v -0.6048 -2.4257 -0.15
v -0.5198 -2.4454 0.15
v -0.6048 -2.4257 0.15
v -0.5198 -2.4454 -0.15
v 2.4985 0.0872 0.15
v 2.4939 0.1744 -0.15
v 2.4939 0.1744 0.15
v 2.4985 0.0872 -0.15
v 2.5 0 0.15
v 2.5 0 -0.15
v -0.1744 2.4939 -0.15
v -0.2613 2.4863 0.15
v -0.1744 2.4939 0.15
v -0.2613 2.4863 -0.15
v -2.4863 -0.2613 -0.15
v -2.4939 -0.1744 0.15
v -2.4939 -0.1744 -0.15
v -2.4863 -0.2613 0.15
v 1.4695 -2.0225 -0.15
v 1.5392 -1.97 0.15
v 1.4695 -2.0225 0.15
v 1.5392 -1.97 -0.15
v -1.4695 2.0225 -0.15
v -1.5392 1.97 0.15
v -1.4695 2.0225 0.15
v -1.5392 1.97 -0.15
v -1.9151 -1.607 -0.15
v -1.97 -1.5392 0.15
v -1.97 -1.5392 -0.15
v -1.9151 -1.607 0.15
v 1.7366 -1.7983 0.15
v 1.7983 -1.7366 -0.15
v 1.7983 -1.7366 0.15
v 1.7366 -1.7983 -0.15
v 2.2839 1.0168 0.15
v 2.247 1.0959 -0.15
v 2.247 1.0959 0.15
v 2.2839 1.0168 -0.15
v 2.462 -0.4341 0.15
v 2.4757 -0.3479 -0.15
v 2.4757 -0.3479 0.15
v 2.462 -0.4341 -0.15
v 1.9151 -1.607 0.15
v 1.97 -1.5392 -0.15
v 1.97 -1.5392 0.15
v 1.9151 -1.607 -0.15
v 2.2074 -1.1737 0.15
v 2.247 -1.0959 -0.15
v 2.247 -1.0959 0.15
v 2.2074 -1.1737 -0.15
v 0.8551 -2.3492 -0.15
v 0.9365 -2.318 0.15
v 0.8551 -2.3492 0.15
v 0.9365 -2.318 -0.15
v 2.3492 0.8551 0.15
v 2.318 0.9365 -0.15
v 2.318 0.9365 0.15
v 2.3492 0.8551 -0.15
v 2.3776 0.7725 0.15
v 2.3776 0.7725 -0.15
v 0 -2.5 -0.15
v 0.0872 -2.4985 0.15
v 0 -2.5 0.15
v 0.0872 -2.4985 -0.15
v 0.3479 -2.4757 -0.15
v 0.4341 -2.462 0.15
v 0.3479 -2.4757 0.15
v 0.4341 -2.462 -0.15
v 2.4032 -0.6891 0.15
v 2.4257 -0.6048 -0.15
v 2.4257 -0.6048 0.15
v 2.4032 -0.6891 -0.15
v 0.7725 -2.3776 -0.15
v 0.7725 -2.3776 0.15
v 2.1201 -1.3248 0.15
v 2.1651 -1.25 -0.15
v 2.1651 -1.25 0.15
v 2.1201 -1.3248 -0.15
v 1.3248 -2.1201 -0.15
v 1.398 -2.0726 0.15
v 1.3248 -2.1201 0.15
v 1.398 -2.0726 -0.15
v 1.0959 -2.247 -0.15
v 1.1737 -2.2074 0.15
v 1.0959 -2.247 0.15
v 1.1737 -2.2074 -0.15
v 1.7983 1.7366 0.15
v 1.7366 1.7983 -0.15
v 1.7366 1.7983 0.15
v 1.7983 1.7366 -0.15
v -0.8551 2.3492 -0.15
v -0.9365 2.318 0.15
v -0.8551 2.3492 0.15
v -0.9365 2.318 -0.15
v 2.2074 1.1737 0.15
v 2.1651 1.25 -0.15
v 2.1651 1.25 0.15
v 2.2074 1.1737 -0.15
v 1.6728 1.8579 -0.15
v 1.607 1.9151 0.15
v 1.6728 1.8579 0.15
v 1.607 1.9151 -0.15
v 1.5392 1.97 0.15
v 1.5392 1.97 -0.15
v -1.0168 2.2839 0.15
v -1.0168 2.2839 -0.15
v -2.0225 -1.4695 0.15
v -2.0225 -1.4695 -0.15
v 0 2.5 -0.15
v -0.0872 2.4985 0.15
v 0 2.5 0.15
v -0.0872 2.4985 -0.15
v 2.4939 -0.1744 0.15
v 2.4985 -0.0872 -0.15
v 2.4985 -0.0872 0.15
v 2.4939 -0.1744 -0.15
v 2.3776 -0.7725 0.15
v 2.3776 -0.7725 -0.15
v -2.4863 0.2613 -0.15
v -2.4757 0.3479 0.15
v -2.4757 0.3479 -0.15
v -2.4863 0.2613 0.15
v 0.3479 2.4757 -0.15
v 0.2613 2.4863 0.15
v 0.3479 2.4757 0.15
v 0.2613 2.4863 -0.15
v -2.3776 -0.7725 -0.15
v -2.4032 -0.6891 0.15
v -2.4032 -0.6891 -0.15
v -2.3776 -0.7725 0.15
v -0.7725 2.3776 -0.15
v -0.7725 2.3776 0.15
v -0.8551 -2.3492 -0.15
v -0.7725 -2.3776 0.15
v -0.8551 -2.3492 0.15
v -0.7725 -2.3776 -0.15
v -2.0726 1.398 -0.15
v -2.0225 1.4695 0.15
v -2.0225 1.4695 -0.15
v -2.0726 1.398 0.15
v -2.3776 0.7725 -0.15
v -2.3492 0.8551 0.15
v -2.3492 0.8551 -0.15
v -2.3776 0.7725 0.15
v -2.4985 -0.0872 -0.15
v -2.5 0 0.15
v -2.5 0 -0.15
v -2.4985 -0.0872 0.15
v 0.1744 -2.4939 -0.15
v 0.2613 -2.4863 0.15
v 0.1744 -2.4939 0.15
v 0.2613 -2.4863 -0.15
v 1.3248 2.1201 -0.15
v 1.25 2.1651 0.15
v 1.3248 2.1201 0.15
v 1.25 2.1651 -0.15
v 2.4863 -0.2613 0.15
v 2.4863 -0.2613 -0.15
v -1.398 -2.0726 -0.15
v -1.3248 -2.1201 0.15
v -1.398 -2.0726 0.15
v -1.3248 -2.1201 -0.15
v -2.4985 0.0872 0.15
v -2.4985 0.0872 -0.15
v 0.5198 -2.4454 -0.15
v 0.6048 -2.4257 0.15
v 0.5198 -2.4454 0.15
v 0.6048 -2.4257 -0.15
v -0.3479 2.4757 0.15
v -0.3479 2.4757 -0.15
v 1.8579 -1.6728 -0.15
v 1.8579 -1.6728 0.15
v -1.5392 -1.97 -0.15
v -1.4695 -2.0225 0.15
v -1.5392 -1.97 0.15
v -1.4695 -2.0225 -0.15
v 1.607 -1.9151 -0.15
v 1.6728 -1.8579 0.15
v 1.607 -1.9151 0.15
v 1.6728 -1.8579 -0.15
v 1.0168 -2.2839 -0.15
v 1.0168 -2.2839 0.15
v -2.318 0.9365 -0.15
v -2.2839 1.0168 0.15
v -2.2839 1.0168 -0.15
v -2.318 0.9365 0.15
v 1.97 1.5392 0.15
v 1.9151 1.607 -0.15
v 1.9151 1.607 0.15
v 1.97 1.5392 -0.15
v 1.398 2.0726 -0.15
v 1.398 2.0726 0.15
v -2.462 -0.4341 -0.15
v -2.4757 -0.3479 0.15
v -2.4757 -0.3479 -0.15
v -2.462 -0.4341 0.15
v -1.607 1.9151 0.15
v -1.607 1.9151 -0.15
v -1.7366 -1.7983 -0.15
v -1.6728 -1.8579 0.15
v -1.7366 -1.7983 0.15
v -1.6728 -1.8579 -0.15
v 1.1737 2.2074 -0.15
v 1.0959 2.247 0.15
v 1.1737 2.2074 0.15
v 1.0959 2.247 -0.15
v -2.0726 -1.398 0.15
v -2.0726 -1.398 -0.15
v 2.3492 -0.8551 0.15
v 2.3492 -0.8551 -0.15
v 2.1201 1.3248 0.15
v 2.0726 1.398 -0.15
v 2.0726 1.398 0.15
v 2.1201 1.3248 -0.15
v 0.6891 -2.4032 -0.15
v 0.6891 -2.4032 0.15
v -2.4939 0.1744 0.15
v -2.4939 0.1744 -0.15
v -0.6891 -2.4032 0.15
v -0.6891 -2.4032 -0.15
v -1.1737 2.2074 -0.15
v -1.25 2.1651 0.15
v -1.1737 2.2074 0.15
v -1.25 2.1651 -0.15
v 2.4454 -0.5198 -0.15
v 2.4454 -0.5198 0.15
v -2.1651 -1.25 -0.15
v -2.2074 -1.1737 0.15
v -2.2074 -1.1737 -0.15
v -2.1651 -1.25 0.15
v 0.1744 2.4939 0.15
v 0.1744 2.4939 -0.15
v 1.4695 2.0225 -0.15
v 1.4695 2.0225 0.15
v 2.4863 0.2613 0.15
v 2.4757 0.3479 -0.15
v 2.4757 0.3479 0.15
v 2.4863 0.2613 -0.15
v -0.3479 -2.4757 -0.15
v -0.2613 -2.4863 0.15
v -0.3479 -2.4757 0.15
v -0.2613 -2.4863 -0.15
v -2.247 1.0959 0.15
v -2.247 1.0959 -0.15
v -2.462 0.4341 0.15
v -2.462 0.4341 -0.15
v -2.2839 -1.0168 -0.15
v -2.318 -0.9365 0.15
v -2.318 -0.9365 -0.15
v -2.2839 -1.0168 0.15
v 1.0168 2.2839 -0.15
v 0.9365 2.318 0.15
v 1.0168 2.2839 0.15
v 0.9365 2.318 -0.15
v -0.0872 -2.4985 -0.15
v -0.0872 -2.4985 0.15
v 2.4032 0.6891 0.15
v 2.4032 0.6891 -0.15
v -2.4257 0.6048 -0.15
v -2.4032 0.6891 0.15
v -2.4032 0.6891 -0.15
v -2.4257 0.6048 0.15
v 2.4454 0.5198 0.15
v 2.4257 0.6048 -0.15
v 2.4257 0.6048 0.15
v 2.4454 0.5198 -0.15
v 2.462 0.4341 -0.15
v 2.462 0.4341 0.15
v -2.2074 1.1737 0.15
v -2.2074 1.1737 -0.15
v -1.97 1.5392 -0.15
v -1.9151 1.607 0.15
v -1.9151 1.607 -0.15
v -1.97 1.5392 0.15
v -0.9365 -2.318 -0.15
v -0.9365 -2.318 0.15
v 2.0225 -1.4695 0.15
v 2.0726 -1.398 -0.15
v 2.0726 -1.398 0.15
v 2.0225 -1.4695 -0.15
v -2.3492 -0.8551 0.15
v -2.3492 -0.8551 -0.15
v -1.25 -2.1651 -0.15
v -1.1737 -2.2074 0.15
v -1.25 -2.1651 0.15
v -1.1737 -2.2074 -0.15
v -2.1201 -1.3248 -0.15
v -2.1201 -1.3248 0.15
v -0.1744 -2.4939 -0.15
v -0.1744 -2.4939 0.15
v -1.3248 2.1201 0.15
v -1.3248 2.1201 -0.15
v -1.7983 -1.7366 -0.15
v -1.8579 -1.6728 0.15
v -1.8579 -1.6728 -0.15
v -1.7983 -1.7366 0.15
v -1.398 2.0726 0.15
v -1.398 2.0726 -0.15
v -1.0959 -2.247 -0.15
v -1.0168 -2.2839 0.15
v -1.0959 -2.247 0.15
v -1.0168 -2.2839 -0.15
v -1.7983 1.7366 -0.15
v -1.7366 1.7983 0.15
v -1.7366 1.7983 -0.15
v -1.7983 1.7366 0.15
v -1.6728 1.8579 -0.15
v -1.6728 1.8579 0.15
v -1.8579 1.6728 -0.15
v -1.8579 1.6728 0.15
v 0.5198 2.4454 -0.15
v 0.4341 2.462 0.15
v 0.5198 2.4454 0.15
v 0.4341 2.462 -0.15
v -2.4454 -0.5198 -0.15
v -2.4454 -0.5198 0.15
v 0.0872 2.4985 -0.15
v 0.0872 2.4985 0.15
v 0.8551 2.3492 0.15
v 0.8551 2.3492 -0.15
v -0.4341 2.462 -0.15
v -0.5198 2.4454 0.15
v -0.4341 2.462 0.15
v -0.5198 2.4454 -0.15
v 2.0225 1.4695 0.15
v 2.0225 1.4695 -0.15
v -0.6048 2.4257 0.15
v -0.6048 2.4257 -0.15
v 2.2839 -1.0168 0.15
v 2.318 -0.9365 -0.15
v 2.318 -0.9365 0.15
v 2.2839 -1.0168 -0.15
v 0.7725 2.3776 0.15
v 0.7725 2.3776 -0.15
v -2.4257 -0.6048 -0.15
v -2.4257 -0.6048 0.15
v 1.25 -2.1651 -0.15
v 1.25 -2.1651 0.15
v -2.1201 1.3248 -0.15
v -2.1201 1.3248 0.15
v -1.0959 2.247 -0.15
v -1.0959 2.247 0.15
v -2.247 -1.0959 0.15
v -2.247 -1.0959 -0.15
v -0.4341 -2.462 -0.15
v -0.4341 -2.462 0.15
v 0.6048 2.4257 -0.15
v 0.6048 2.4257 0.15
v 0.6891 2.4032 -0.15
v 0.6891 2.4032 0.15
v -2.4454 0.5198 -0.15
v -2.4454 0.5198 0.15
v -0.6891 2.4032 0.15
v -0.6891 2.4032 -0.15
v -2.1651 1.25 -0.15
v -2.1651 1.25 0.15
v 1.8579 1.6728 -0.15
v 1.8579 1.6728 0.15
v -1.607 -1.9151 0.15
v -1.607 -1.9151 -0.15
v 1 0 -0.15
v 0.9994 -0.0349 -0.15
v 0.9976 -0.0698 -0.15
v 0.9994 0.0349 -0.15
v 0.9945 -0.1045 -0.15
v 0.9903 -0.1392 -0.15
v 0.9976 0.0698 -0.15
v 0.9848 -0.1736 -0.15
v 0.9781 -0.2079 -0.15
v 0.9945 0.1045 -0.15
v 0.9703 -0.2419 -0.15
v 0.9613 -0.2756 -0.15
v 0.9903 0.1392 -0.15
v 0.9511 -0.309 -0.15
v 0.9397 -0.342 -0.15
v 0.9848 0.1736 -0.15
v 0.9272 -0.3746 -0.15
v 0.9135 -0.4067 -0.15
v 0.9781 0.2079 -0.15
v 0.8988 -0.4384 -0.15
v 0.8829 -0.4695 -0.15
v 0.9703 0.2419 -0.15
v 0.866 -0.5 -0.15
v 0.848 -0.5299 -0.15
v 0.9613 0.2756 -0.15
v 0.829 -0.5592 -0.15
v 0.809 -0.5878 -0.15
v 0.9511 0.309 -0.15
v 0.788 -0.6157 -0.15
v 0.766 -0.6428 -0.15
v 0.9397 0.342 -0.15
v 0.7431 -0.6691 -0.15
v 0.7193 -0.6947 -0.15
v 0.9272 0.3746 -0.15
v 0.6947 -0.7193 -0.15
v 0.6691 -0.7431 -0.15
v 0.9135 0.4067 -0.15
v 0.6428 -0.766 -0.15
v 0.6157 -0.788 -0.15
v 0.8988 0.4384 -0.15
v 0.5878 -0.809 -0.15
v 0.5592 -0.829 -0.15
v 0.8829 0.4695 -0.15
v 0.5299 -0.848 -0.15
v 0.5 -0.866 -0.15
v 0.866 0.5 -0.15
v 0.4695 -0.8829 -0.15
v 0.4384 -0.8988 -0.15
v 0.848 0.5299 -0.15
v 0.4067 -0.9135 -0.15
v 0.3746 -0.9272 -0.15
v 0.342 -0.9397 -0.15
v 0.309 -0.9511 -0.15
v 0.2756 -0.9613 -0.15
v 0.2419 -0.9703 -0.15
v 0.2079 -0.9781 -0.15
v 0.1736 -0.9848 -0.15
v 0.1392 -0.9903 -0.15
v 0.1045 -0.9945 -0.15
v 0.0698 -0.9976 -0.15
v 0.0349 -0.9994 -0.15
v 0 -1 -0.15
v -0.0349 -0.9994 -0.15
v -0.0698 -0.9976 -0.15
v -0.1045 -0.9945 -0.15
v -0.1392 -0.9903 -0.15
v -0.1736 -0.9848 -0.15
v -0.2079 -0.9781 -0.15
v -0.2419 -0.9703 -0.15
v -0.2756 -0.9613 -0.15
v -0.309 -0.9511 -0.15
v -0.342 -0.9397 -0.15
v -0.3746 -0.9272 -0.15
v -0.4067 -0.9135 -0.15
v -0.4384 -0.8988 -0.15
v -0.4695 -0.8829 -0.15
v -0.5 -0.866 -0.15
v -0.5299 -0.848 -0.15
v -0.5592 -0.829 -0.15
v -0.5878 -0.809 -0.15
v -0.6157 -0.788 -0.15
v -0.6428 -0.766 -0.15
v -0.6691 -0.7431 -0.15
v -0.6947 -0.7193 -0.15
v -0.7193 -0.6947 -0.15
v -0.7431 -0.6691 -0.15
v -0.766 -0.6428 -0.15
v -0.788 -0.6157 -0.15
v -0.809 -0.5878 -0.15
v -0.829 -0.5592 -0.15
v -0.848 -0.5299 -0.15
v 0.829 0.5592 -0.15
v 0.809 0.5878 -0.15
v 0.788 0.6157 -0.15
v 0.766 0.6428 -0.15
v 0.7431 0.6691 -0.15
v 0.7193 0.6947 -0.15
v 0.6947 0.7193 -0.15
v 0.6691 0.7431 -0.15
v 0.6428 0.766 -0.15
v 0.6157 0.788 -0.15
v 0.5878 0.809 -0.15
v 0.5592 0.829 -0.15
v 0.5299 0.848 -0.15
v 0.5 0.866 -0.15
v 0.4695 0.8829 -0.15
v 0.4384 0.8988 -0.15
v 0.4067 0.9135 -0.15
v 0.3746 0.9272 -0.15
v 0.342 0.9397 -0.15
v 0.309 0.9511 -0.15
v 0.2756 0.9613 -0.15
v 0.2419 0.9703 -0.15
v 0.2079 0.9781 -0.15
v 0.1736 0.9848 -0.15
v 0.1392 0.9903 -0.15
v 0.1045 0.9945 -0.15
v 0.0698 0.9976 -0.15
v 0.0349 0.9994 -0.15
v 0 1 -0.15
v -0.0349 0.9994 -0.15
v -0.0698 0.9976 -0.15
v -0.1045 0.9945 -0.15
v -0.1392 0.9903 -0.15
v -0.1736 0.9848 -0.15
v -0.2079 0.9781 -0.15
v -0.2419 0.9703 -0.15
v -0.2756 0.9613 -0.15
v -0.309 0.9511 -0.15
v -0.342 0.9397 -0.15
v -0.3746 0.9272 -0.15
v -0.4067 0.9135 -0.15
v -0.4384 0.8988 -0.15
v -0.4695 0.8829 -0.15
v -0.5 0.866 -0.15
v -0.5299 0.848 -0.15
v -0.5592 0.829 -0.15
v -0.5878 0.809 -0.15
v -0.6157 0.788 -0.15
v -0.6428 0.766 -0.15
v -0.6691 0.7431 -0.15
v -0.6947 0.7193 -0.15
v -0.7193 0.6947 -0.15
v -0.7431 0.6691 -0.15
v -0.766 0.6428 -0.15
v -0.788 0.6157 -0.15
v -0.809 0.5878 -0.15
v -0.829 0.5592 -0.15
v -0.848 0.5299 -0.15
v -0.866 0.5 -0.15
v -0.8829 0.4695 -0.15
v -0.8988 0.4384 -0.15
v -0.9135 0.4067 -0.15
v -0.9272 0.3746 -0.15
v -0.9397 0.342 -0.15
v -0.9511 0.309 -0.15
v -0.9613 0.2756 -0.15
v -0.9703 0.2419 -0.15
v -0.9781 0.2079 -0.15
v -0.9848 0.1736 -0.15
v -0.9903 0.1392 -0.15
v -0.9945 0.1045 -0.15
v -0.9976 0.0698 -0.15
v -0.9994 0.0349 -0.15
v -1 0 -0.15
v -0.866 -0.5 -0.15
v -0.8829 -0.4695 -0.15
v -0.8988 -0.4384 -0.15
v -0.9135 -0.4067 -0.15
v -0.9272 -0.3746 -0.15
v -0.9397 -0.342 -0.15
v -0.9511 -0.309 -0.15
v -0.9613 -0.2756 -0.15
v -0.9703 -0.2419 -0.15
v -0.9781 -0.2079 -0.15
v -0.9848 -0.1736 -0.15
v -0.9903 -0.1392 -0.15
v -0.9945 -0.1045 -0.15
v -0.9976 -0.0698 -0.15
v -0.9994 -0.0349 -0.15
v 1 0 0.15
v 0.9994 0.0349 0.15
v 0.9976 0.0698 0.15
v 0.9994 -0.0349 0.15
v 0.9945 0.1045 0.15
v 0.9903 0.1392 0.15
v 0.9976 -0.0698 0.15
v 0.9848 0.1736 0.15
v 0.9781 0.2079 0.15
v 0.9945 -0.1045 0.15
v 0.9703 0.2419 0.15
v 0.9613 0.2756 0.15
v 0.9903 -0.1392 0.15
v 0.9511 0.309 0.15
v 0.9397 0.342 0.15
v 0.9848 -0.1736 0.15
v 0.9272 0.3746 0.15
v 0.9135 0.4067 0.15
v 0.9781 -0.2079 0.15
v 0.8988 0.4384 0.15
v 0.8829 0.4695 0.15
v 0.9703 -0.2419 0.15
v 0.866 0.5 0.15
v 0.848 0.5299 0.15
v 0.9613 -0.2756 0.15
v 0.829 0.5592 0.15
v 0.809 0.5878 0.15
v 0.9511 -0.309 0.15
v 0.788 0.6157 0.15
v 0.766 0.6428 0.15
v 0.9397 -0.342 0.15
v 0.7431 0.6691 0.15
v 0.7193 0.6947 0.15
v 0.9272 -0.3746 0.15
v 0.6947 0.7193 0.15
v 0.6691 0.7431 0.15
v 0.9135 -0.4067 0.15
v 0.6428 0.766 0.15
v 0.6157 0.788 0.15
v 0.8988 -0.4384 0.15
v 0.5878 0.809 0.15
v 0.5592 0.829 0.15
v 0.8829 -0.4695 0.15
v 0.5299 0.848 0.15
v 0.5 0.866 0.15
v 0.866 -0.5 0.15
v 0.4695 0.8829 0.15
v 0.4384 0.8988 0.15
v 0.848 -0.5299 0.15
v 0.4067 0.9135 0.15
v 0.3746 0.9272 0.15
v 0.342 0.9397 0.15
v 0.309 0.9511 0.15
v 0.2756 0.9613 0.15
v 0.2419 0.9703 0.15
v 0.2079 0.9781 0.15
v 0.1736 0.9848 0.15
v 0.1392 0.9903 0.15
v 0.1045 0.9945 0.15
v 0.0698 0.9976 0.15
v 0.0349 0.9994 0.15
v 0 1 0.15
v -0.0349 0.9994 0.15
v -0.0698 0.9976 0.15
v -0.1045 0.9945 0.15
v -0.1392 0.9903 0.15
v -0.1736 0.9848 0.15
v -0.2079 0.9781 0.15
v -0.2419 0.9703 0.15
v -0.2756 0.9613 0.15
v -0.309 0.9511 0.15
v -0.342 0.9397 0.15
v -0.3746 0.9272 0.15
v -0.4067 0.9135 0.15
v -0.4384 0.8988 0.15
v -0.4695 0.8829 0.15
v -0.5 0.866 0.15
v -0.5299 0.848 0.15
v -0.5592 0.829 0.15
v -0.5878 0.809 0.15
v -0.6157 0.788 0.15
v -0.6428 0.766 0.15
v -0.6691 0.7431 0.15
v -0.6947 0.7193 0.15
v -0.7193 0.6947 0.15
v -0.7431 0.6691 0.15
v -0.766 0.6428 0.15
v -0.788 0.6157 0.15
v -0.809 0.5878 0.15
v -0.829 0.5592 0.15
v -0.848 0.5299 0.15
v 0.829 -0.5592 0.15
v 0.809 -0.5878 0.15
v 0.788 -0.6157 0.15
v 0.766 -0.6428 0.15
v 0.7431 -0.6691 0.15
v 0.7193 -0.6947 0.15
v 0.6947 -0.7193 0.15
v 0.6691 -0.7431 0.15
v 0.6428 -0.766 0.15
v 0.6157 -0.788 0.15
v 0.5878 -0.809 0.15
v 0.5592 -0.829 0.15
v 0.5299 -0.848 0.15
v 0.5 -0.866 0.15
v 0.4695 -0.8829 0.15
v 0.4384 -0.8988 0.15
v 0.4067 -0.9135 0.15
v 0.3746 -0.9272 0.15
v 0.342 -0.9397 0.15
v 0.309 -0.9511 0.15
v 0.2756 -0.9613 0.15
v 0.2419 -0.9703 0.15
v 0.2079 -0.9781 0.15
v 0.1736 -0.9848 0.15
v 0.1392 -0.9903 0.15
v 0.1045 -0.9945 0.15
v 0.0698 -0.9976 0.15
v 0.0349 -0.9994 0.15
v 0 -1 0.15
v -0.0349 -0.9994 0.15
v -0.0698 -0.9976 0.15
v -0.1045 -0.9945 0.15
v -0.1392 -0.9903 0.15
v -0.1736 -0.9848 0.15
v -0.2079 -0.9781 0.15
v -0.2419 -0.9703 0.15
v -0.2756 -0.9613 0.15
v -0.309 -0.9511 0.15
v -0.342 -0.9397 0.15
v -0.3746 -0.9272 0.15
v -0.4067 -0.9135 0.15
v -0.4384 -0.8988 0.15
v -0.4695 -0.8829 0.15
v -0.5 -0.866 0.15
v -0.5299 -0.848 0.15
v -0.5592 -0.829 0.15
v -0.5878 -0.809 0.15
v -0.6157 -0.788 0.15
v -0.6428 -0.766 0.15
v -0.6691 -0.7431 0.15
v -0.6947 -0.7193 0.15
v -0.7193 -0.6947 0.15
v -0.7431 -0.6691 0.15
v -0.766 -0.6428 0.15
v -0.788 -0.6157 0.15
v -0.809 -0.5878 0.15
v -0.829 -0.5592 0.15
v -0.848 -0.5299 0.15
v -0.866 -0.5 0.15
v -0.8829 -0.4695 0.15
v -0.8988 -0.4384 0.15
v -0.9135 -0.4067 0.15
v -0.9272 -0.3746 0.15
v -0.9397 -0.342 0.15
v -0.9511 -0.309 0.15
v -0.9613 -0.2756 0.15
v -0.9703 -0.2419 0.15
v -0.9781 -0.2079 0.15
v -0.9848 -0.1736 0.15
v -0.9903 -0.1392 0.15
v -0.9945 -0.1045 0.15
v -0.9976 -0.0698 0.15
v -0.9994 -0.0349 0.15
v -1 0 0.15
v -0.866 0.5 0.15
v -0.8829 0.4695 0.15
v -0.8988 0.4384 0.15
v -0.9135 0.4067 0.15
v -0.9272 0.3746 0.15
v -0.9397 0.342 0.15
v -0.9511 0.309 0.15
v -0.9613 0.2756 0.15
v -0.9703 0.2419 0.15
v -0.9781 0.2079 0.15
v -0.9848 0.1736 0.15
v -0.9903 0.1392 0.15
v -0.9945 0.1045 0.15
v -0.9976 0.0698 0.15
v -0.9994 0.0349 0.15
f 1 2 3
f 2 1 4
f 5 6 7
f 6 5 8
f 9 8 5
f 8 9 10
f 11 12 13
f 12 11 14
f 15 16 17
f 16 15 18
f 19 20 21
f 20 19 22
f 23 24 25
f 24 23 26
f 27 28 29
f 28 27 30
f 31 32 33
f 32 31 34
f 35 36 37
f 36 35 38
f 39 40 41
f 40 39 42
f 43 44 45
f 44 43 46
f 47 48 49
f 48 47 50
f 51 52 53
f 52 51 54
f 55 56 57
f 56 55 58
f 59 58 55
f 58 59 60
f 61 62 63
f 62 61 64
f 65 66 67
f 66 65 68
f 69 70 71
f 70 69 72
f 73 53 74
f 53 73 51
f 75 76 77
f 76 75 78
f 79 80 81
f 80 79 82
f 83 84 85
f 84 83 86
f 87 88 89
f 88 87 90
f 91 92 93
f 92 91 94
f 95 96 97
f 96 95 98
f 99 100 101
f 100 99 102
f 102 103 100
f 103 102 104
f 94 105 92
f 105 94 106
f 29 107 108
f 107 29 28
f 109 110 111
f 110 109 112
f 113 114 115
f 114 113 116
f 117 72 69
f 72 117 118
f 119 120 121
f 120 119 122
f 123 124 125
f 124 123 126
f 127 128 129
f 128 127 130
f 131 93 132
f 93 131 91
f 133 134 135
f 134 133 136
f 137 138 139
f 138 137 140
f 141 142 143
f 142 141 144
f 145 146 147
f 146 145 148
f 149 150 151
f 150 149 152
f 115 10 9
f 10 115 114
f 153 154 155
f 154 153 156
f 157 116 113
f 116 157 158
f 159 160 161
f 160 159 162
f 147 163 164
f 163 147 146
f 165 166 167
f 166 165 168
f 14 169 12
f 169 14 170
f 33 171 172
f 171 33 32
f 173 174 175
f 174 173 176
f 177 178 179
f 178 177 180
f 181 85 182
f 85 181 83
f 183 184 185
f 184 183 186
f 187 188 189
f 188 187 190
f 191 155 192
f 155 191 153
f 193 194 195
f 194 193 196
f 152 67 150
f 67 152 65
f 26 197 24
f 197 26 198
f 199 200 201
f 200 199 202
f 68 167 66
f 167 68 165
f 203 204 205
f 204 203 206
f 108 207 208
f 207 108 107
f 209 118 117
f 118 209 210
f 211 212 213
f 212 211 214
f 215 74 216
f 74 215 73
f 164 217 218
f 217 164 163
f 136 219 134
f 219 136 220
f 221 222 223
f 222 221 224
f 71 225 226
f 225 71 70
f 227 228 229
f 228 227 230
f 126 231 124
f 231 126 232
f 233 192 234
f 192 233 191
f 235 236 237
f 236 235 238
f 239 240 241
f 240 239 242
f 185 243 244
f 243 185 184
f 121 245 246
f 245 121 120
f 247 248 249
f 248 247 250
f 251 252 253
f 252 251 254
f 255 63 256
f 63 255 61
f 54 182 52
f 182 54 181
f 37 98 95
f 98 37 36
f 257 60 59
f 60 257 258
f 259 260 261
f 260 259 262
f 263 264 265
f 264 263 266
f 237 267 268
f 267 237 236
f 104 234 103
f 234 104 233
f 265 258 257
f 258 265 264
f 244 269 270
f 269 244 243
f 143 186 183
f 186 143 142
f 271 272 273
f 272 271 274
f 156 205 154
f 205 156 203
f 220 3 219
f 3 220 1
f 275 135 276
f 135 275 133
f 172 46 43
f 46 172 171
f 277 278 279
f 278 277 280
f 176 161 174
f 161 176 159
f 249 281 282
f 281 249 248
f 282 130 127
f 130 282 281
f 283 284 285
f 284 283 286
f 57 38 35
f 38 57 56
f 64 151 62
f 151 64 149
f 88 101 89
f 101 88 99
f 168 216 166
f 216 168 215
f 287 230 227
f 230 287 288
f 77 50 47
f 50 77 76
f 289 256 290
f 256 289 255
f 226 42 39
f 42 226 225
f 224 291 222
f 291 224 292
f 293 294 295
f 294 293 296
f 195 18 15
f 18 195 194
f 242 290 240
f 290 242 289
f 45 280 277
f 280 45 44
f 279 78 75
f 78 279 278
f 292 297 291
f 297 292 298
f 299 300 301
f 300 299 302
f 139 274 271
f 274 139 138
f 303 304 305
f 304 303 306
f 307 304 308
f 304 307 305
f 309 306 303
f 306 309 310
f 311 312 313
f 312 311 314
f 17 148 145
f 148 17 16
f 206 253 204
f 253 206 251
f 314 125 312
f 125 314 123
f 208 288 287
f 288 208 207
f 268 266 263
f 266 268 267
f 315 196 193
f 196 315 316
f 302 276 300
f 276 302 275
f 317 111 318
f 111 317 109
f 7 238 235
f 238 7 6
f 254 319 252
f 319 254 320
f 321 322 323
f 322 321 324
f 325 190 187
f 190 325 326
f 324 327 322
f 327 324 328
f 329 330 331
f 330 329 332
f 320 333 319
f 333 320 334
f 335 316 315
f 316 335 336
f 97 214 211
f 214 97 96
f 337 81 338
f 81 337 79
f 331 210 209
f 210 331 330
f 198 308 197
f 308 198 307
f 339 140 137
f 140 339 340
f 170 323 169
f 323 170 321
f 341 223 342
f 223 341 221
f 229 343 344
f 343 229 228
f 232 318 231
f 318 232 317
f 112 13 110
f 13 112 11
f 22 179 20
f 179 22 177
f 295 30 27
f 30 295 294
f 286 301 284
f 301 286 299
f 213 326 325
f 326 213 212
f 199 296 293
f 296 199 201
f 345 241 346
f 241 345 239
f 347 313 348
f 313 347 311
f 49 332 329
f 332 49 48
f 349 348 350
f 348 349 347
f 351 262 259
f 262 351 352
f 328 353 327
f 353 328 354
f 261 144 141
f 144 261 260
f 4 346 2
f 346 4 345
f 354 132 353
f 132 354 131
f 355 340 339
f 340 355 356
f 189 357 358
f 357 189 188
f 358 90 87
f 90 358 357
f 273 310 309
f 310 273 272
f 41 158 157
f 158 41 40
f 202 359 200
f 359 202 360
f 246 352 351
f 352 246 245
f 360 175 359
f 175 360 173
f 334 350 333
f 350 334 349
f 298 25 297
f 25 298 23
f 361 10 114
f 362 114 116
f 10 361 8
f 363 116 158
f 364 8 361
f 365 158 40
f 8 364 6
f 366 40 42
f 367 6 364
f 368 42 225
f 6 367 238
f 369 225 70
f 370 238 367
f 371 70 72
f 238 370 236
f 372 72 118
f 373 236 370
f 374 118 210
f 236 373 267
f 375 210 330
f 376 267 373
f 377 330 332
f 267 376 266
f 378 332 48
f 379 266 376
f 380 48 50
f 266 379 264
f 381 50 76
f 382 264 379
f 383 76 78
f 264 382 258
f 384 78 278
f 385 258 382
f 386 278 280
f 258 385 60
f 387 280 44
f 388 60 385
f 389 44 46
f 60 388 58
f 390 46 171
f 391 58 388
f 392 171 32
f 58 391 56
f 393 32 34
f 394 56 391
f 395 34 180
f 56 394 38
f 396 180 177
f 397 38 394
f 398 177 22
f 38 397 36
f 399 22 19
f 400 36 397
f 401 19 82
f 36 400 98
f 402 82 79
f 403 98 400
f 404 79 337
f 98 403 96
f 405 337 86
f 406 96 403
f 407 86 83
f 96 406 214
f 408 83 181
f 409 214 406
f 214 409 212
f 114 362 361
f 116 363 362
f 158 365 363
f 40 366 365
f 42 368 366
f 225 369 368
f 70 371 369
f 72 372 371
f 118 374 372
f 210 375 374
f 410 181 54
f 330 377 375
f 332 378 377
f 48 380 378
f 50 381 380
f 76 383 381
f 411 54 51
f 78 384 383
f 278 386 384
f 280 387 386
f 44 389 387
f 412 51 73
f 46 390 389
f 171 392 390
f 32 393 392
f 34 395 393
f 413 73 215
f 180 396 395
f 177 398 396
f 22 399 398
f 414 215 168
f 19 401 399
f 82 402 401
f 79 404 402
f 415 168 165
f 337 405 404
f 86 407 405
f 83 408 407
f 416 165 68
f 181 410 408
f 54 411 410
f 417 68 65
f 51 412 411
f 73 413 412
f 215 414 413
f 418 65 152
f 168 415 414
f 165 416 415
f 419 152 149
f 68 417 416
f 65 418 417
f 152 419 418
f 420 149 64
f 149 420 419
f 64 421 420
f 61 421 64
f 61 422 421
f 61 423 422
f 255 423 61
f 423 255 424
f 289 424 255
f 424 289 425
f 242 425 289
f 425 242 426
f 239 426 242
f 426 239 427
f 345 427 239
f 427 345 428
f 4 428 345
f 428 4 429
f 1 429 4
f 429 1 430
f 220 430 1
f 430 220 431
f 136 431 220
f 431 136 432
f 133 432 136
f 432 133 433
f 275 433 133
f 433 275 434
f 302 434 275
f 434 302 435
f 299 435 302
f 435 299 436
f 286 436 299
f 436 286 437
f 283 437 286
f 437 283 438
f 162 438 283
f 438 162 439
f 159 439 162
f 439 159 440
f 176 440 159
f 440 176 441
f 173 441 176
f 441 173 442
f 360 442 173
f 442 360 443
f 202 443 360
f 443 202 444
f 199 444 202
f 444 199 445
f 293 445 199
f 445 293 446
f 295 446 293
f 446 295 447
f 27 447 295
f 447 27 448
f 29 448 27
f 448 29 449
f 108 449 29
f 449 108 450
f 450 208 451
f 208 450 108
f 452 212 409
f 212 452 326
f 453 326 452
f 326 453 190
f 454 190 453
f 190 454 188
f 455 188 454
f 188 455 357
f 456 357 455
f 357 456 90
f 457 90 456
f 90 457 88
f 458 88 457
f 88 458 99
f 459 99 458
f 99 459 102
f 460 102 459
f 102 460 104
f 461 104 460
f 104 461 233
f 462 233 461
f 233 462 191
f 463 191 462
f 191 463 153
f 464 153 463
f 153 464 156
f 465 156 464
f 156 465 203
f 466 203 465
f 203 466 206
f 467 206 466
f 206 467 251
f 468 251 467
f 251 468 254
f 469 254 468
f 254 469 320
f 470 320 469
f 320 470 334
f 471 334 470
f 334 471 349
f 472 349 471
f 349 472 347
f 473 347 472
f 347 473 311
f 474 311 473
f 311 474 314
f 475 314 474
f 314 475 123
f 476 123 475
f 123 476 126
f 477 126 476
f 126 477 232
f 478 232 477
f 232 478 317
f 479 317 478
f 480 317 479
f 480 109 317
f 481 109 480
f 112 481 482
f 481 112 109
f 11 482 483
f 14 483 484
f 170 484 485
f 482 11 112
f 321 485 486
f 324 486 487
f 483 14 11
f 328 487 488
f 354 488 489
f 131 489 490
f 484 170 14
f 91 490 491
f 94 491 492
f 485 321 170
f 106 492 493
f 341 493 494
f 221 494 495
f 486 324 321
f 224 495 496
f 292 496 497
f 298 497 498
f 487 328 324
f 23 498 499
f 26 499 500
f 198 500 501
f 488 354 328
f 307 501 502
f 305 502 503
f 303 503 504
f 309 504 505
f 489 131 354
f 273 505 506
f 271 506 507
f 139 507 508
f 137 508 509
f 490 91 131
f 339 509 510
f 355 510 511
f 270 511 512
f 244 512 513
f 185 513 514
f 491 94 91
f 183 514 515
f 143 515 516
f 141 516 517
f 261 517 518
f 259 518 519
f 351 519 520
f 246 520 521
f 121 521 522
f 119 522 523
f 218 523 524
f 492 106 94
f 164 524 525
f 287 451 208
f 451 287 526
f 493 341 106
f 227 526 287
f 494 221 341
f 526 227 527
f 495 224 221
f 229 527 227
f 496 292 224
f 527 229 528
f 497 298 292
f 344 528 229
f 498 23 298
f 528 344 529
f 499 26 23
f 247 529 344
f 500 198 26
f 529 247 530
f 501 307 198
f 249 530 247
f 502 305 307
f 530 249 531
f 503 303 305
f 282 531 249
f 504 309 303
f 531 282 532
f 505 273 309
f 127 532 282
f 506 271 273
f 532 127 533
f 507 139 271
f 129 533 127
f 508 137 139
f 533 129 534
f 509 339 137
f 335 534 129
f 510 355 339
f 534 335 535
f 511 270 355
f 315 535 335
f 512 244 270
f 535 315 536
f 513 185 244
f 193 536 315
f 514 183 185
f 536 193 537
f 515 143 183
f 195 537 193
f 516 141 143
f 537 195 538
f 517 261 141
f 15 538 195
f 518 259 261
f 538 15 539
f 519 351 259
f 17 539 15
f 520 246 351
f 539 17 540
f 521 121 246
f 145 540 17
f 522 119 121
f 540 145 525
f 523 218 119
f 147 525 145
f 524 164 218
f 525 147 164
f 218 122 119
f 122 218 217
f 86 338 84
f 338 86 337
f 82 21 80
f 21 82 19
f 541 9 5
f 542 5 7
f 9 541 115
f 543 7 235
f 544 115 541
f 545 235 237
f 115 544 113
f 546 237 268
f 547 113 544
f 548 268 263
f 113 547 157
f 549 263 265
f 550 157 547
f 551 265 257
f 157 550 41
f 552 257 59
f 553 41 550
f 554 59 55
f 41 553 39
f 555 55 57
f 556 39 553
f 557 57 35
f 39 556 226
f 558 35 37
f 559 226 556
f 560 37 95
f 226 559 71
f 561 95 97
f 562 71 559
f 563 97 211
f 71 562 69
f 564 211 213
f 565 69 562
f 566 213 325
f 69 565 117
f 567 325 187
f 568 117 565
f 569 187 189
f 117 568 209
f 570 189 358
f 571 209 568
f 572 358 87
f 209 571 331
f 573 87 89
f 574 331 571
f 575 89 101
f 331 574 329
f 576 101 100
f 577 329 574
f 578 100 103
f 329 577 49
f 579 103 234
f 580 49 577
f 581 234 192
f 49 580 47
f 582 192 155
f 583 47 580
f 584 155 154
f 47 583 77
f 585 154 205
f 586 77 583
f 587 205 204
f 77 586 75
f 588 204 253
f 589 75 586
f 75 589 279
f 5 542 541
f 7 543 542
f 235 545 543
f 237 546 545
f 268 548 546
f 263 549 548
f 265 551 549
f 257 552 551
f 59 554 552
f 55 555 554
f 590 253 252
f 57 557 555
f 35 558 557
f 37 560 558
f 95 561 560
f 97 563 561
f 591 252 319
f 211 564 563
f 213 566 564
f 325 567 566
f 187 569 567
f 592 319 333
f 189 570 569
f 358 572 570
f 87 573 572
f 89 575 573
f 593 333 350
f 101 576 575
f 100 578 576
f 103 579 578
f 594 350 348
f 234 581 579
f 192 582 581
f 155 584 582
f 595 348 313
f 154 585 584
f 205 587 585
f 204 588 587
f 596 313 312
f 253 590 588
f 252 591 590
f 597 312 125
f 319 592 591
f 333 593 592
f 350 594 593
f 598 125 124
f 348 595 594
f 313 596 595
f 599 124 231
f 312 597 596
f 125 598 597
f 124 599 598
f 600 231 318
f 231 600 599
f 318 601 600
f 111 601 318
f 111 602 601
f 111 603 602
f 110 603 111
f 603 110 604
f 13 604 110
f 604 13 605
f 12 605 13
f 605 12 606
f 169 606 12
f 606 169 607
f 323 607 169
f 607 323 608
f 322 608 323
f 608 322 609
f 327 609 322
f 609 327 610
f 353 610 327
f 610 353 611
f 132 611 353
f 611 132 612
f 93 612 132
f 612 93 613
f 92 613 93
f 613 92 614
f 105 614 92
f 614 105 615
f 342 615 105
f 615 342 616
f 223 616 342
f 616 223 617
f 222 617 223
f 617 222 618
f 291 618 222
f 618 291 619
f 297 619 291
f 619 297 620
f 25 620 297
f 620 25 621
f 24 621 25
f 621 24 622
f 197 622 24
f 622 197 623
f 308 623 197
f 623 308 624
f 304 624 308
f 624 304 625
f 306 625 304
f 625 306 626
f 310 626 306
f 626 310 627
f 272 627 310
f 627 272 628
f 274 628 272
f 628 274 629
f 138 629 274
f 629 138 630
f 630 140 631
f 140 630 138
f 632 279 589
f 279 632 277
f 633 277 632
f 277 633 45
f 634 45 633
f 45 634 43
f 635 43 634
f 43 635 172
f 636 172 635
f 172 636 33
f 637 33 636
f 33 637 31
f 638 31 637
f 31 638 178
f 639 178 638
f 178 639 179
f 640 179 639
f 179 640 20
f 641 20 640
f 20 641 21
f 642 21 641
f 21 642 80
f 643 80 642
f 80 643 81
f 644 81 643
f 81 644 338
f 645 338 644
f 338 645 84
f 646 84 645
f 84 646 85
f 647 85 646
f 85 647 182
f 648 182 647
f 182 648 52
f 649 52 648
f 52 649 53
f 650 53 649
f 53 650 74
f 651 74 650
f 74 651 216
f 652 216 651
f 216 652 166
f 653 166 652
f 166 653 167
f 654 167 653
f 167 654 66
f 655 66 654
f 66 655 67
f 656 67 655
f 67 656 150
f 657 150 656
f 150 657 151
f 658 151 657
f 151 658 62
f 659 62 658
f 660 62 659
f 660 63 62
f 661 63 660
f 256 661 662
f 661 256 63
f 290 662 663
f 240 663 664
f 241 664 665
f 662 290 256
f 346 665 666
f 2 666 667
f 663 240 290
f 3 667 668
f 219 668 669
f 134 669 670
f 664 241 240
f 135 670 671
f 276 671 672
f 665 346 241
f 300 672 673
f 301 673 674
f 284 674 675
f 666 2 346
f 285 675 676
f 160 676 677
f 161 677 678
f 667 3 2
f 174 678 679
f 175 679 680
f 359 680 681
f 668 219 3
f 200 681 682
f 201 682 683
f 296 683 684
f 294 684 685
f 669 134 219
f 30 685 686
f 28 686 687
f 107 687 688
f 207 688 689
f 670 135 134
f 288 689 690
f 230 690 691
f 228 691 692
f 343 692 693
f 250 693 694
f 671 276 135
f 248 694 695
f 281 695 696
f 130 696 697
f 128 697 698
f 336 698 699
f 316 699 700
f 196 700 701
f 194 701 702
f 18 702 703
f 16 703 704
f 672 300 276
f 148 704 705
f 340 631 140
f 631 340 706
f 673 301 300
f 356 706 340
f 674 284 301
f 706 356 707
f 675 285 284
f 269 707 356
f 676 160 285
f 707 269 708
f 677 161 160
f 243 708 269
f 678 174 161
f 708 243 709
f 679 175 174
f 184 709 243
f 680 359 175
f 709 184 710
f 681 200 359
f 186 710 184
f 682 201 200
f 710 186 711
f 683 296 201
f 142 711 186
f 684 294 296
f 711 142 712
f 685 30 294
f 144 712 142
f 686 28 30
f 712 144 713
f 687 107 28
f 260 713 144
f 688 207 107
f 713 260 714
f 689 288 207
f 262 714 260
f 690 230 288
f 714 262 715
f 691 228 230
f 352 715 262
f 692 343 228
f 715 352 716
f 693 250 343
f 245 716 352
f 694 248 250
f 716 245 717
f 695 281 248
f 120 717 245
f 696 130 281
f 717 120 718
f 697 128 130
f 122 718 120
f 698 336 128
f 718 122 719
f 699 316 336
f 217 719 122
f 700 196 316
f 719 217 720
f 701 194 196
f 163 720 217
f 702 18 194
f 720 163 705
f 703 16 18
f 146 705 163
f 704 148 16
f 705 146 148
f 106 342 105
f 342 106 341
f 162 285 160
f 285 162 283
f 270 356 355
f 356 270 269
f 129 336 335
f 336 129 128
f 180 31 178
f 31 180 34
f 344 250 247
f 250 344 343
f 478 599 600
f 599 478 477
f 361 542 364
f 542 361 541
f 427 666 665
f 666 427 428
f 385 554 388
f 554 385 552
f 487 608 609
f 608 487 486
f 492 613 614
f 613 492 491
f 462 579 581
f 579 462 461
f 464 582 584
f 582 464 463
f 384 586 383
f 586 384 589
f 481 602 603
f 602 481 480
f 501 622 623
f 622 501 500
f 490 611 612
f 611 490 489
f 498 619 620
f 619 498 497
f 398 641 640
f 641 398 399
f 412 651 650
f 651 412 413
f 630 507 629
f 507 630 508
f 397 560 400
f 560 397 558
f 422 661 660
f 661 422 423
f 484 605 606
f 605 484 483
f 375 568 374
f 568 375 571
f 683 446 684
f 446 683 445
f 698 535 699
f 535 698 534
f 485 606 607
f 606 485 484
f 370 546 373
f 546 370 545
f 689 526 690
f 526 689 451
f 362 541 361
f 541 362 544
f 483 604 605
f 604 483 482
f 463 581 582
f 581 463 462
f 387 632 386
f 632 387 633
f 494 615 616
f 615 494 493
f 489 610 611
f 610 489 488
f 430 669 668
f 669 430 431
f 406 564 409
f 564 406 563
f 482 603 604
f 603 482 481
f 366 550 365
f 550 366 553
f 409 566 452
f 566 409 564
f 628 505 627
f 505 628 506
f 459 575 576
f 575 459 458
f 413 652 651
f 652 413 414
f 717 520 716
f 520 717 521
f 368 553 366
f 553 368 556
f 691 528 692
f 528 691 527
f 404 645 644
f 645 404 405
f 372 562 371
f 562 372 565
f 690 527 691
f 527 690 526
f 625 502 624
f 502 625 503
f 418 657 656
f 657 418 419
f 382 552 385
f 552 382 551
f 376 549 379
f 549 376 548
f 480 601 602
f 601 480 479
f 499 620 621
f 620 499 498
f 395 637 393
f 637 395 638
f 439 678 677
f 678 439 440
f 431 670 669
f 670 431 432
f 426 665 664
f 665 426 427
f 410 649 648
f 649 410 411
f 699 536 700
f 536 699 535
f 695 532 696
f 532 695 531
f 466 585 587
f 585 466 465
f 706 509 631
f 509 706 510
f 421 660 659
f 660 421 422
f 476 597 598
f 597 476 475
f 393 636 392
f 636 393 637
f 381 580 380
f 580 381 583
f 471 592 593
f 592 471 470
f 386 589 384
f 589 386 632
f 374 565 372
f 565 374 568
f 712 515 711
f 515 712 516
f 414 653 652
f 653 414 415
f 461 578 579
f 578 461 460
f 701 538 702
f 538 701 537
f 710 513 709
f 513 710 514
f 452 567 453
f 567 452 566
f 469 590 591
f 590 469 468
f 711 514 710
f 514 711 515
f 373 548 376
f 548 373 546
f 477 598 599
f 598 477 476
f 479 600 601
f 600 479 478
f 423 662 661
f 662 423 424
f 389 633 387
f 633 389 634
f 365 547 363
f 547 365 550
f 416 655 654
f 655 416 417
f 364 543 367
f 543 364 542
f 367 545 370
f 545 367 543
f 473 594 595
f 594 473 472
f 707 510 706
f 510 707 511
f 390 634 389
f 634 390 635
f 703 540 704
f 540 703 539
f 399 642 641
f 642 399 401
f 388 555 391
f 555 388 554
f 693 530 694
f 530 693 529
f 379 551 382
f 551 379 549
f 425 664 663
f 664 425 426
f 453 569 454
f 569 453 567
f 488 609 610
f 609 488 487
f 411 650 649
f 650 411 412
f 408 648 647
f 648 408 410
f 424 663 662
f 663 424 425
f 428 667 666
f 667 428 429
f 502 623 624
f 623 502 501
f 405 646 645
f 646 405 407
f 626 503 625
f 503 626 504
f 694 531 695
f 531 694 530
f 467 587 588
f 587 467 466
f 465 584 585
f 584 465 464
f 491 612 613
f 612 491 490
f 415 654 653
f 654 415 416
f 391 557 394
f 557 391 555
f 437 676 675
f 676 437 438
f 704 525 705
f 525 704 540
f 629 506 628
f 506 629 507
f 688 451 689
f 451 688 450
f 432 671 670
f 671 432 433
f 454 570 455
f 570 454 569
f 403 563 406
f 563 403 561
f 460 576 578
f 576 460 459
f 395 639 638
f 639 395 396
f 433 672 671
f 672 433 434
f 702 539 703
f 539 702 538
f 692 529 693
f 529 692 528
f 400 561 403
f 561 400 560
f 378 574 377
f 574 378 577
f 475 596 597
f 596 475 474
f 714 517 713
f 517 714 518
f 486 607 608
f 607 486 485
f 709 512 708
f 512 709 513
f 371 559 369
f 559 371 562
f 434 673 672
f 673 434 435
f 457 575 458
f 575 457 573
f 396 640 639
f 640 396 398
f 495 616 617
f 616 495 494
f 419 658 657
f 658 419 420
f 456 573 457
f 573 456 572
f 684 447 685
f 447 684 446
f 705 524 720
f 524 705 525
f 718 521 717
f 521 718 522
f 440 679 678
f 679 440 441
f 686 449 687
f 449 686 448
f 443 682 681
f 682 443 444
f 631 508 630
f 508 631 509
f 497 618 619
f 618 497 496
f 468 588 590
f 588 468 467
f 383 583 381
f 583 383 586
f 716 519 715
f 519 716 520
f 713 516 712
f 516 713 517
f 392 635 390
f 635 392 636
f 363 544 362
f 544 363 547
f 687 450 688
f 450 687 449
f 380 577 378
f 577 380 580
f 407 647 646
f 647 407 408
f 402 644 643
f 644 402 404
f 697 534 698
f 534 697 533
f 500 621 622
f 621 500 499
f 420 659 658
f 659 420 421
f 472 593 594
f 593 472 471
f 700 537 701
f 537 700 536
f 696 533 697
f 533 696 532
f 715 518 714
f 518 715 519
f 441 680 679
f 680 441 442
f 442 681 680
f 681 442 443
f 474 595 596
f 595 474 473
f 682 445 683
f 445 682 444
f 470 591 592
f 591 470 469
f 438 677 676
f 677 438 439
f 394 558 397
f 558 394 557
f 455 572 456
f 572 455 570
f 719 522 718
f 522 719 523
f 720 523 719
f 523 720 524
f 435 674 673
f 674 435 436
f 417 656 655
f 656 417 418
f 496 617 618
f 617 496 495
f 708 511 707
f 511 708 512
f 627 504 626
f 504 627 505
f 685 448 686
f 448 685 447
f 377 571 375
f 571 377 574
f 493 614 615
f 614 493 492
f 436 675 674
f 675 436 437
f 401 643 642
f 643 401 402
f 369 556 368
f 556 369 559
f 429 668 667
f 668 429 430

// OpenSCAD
// Flat washer: 2.0mm ID, 5.0mm OD, 0.3mm thickness

outer_diameter = 5.0;
inner_diameter = 2.0;
thickness      = 0.3;

// High resolution for true circles (avoid polygonal/octagonal look)
$fn = 180;

module washer(od, id, h) {
    difference() {
        cylinder(d=od, h=h, center=true);
        // Slightly taller cutter ensures a clean through-hole without affecting thickness
        cylinder(d=id, h=h + 0.2, center=true);
    }
}

washer(outer_diameter, inner_diameter, thickness);
